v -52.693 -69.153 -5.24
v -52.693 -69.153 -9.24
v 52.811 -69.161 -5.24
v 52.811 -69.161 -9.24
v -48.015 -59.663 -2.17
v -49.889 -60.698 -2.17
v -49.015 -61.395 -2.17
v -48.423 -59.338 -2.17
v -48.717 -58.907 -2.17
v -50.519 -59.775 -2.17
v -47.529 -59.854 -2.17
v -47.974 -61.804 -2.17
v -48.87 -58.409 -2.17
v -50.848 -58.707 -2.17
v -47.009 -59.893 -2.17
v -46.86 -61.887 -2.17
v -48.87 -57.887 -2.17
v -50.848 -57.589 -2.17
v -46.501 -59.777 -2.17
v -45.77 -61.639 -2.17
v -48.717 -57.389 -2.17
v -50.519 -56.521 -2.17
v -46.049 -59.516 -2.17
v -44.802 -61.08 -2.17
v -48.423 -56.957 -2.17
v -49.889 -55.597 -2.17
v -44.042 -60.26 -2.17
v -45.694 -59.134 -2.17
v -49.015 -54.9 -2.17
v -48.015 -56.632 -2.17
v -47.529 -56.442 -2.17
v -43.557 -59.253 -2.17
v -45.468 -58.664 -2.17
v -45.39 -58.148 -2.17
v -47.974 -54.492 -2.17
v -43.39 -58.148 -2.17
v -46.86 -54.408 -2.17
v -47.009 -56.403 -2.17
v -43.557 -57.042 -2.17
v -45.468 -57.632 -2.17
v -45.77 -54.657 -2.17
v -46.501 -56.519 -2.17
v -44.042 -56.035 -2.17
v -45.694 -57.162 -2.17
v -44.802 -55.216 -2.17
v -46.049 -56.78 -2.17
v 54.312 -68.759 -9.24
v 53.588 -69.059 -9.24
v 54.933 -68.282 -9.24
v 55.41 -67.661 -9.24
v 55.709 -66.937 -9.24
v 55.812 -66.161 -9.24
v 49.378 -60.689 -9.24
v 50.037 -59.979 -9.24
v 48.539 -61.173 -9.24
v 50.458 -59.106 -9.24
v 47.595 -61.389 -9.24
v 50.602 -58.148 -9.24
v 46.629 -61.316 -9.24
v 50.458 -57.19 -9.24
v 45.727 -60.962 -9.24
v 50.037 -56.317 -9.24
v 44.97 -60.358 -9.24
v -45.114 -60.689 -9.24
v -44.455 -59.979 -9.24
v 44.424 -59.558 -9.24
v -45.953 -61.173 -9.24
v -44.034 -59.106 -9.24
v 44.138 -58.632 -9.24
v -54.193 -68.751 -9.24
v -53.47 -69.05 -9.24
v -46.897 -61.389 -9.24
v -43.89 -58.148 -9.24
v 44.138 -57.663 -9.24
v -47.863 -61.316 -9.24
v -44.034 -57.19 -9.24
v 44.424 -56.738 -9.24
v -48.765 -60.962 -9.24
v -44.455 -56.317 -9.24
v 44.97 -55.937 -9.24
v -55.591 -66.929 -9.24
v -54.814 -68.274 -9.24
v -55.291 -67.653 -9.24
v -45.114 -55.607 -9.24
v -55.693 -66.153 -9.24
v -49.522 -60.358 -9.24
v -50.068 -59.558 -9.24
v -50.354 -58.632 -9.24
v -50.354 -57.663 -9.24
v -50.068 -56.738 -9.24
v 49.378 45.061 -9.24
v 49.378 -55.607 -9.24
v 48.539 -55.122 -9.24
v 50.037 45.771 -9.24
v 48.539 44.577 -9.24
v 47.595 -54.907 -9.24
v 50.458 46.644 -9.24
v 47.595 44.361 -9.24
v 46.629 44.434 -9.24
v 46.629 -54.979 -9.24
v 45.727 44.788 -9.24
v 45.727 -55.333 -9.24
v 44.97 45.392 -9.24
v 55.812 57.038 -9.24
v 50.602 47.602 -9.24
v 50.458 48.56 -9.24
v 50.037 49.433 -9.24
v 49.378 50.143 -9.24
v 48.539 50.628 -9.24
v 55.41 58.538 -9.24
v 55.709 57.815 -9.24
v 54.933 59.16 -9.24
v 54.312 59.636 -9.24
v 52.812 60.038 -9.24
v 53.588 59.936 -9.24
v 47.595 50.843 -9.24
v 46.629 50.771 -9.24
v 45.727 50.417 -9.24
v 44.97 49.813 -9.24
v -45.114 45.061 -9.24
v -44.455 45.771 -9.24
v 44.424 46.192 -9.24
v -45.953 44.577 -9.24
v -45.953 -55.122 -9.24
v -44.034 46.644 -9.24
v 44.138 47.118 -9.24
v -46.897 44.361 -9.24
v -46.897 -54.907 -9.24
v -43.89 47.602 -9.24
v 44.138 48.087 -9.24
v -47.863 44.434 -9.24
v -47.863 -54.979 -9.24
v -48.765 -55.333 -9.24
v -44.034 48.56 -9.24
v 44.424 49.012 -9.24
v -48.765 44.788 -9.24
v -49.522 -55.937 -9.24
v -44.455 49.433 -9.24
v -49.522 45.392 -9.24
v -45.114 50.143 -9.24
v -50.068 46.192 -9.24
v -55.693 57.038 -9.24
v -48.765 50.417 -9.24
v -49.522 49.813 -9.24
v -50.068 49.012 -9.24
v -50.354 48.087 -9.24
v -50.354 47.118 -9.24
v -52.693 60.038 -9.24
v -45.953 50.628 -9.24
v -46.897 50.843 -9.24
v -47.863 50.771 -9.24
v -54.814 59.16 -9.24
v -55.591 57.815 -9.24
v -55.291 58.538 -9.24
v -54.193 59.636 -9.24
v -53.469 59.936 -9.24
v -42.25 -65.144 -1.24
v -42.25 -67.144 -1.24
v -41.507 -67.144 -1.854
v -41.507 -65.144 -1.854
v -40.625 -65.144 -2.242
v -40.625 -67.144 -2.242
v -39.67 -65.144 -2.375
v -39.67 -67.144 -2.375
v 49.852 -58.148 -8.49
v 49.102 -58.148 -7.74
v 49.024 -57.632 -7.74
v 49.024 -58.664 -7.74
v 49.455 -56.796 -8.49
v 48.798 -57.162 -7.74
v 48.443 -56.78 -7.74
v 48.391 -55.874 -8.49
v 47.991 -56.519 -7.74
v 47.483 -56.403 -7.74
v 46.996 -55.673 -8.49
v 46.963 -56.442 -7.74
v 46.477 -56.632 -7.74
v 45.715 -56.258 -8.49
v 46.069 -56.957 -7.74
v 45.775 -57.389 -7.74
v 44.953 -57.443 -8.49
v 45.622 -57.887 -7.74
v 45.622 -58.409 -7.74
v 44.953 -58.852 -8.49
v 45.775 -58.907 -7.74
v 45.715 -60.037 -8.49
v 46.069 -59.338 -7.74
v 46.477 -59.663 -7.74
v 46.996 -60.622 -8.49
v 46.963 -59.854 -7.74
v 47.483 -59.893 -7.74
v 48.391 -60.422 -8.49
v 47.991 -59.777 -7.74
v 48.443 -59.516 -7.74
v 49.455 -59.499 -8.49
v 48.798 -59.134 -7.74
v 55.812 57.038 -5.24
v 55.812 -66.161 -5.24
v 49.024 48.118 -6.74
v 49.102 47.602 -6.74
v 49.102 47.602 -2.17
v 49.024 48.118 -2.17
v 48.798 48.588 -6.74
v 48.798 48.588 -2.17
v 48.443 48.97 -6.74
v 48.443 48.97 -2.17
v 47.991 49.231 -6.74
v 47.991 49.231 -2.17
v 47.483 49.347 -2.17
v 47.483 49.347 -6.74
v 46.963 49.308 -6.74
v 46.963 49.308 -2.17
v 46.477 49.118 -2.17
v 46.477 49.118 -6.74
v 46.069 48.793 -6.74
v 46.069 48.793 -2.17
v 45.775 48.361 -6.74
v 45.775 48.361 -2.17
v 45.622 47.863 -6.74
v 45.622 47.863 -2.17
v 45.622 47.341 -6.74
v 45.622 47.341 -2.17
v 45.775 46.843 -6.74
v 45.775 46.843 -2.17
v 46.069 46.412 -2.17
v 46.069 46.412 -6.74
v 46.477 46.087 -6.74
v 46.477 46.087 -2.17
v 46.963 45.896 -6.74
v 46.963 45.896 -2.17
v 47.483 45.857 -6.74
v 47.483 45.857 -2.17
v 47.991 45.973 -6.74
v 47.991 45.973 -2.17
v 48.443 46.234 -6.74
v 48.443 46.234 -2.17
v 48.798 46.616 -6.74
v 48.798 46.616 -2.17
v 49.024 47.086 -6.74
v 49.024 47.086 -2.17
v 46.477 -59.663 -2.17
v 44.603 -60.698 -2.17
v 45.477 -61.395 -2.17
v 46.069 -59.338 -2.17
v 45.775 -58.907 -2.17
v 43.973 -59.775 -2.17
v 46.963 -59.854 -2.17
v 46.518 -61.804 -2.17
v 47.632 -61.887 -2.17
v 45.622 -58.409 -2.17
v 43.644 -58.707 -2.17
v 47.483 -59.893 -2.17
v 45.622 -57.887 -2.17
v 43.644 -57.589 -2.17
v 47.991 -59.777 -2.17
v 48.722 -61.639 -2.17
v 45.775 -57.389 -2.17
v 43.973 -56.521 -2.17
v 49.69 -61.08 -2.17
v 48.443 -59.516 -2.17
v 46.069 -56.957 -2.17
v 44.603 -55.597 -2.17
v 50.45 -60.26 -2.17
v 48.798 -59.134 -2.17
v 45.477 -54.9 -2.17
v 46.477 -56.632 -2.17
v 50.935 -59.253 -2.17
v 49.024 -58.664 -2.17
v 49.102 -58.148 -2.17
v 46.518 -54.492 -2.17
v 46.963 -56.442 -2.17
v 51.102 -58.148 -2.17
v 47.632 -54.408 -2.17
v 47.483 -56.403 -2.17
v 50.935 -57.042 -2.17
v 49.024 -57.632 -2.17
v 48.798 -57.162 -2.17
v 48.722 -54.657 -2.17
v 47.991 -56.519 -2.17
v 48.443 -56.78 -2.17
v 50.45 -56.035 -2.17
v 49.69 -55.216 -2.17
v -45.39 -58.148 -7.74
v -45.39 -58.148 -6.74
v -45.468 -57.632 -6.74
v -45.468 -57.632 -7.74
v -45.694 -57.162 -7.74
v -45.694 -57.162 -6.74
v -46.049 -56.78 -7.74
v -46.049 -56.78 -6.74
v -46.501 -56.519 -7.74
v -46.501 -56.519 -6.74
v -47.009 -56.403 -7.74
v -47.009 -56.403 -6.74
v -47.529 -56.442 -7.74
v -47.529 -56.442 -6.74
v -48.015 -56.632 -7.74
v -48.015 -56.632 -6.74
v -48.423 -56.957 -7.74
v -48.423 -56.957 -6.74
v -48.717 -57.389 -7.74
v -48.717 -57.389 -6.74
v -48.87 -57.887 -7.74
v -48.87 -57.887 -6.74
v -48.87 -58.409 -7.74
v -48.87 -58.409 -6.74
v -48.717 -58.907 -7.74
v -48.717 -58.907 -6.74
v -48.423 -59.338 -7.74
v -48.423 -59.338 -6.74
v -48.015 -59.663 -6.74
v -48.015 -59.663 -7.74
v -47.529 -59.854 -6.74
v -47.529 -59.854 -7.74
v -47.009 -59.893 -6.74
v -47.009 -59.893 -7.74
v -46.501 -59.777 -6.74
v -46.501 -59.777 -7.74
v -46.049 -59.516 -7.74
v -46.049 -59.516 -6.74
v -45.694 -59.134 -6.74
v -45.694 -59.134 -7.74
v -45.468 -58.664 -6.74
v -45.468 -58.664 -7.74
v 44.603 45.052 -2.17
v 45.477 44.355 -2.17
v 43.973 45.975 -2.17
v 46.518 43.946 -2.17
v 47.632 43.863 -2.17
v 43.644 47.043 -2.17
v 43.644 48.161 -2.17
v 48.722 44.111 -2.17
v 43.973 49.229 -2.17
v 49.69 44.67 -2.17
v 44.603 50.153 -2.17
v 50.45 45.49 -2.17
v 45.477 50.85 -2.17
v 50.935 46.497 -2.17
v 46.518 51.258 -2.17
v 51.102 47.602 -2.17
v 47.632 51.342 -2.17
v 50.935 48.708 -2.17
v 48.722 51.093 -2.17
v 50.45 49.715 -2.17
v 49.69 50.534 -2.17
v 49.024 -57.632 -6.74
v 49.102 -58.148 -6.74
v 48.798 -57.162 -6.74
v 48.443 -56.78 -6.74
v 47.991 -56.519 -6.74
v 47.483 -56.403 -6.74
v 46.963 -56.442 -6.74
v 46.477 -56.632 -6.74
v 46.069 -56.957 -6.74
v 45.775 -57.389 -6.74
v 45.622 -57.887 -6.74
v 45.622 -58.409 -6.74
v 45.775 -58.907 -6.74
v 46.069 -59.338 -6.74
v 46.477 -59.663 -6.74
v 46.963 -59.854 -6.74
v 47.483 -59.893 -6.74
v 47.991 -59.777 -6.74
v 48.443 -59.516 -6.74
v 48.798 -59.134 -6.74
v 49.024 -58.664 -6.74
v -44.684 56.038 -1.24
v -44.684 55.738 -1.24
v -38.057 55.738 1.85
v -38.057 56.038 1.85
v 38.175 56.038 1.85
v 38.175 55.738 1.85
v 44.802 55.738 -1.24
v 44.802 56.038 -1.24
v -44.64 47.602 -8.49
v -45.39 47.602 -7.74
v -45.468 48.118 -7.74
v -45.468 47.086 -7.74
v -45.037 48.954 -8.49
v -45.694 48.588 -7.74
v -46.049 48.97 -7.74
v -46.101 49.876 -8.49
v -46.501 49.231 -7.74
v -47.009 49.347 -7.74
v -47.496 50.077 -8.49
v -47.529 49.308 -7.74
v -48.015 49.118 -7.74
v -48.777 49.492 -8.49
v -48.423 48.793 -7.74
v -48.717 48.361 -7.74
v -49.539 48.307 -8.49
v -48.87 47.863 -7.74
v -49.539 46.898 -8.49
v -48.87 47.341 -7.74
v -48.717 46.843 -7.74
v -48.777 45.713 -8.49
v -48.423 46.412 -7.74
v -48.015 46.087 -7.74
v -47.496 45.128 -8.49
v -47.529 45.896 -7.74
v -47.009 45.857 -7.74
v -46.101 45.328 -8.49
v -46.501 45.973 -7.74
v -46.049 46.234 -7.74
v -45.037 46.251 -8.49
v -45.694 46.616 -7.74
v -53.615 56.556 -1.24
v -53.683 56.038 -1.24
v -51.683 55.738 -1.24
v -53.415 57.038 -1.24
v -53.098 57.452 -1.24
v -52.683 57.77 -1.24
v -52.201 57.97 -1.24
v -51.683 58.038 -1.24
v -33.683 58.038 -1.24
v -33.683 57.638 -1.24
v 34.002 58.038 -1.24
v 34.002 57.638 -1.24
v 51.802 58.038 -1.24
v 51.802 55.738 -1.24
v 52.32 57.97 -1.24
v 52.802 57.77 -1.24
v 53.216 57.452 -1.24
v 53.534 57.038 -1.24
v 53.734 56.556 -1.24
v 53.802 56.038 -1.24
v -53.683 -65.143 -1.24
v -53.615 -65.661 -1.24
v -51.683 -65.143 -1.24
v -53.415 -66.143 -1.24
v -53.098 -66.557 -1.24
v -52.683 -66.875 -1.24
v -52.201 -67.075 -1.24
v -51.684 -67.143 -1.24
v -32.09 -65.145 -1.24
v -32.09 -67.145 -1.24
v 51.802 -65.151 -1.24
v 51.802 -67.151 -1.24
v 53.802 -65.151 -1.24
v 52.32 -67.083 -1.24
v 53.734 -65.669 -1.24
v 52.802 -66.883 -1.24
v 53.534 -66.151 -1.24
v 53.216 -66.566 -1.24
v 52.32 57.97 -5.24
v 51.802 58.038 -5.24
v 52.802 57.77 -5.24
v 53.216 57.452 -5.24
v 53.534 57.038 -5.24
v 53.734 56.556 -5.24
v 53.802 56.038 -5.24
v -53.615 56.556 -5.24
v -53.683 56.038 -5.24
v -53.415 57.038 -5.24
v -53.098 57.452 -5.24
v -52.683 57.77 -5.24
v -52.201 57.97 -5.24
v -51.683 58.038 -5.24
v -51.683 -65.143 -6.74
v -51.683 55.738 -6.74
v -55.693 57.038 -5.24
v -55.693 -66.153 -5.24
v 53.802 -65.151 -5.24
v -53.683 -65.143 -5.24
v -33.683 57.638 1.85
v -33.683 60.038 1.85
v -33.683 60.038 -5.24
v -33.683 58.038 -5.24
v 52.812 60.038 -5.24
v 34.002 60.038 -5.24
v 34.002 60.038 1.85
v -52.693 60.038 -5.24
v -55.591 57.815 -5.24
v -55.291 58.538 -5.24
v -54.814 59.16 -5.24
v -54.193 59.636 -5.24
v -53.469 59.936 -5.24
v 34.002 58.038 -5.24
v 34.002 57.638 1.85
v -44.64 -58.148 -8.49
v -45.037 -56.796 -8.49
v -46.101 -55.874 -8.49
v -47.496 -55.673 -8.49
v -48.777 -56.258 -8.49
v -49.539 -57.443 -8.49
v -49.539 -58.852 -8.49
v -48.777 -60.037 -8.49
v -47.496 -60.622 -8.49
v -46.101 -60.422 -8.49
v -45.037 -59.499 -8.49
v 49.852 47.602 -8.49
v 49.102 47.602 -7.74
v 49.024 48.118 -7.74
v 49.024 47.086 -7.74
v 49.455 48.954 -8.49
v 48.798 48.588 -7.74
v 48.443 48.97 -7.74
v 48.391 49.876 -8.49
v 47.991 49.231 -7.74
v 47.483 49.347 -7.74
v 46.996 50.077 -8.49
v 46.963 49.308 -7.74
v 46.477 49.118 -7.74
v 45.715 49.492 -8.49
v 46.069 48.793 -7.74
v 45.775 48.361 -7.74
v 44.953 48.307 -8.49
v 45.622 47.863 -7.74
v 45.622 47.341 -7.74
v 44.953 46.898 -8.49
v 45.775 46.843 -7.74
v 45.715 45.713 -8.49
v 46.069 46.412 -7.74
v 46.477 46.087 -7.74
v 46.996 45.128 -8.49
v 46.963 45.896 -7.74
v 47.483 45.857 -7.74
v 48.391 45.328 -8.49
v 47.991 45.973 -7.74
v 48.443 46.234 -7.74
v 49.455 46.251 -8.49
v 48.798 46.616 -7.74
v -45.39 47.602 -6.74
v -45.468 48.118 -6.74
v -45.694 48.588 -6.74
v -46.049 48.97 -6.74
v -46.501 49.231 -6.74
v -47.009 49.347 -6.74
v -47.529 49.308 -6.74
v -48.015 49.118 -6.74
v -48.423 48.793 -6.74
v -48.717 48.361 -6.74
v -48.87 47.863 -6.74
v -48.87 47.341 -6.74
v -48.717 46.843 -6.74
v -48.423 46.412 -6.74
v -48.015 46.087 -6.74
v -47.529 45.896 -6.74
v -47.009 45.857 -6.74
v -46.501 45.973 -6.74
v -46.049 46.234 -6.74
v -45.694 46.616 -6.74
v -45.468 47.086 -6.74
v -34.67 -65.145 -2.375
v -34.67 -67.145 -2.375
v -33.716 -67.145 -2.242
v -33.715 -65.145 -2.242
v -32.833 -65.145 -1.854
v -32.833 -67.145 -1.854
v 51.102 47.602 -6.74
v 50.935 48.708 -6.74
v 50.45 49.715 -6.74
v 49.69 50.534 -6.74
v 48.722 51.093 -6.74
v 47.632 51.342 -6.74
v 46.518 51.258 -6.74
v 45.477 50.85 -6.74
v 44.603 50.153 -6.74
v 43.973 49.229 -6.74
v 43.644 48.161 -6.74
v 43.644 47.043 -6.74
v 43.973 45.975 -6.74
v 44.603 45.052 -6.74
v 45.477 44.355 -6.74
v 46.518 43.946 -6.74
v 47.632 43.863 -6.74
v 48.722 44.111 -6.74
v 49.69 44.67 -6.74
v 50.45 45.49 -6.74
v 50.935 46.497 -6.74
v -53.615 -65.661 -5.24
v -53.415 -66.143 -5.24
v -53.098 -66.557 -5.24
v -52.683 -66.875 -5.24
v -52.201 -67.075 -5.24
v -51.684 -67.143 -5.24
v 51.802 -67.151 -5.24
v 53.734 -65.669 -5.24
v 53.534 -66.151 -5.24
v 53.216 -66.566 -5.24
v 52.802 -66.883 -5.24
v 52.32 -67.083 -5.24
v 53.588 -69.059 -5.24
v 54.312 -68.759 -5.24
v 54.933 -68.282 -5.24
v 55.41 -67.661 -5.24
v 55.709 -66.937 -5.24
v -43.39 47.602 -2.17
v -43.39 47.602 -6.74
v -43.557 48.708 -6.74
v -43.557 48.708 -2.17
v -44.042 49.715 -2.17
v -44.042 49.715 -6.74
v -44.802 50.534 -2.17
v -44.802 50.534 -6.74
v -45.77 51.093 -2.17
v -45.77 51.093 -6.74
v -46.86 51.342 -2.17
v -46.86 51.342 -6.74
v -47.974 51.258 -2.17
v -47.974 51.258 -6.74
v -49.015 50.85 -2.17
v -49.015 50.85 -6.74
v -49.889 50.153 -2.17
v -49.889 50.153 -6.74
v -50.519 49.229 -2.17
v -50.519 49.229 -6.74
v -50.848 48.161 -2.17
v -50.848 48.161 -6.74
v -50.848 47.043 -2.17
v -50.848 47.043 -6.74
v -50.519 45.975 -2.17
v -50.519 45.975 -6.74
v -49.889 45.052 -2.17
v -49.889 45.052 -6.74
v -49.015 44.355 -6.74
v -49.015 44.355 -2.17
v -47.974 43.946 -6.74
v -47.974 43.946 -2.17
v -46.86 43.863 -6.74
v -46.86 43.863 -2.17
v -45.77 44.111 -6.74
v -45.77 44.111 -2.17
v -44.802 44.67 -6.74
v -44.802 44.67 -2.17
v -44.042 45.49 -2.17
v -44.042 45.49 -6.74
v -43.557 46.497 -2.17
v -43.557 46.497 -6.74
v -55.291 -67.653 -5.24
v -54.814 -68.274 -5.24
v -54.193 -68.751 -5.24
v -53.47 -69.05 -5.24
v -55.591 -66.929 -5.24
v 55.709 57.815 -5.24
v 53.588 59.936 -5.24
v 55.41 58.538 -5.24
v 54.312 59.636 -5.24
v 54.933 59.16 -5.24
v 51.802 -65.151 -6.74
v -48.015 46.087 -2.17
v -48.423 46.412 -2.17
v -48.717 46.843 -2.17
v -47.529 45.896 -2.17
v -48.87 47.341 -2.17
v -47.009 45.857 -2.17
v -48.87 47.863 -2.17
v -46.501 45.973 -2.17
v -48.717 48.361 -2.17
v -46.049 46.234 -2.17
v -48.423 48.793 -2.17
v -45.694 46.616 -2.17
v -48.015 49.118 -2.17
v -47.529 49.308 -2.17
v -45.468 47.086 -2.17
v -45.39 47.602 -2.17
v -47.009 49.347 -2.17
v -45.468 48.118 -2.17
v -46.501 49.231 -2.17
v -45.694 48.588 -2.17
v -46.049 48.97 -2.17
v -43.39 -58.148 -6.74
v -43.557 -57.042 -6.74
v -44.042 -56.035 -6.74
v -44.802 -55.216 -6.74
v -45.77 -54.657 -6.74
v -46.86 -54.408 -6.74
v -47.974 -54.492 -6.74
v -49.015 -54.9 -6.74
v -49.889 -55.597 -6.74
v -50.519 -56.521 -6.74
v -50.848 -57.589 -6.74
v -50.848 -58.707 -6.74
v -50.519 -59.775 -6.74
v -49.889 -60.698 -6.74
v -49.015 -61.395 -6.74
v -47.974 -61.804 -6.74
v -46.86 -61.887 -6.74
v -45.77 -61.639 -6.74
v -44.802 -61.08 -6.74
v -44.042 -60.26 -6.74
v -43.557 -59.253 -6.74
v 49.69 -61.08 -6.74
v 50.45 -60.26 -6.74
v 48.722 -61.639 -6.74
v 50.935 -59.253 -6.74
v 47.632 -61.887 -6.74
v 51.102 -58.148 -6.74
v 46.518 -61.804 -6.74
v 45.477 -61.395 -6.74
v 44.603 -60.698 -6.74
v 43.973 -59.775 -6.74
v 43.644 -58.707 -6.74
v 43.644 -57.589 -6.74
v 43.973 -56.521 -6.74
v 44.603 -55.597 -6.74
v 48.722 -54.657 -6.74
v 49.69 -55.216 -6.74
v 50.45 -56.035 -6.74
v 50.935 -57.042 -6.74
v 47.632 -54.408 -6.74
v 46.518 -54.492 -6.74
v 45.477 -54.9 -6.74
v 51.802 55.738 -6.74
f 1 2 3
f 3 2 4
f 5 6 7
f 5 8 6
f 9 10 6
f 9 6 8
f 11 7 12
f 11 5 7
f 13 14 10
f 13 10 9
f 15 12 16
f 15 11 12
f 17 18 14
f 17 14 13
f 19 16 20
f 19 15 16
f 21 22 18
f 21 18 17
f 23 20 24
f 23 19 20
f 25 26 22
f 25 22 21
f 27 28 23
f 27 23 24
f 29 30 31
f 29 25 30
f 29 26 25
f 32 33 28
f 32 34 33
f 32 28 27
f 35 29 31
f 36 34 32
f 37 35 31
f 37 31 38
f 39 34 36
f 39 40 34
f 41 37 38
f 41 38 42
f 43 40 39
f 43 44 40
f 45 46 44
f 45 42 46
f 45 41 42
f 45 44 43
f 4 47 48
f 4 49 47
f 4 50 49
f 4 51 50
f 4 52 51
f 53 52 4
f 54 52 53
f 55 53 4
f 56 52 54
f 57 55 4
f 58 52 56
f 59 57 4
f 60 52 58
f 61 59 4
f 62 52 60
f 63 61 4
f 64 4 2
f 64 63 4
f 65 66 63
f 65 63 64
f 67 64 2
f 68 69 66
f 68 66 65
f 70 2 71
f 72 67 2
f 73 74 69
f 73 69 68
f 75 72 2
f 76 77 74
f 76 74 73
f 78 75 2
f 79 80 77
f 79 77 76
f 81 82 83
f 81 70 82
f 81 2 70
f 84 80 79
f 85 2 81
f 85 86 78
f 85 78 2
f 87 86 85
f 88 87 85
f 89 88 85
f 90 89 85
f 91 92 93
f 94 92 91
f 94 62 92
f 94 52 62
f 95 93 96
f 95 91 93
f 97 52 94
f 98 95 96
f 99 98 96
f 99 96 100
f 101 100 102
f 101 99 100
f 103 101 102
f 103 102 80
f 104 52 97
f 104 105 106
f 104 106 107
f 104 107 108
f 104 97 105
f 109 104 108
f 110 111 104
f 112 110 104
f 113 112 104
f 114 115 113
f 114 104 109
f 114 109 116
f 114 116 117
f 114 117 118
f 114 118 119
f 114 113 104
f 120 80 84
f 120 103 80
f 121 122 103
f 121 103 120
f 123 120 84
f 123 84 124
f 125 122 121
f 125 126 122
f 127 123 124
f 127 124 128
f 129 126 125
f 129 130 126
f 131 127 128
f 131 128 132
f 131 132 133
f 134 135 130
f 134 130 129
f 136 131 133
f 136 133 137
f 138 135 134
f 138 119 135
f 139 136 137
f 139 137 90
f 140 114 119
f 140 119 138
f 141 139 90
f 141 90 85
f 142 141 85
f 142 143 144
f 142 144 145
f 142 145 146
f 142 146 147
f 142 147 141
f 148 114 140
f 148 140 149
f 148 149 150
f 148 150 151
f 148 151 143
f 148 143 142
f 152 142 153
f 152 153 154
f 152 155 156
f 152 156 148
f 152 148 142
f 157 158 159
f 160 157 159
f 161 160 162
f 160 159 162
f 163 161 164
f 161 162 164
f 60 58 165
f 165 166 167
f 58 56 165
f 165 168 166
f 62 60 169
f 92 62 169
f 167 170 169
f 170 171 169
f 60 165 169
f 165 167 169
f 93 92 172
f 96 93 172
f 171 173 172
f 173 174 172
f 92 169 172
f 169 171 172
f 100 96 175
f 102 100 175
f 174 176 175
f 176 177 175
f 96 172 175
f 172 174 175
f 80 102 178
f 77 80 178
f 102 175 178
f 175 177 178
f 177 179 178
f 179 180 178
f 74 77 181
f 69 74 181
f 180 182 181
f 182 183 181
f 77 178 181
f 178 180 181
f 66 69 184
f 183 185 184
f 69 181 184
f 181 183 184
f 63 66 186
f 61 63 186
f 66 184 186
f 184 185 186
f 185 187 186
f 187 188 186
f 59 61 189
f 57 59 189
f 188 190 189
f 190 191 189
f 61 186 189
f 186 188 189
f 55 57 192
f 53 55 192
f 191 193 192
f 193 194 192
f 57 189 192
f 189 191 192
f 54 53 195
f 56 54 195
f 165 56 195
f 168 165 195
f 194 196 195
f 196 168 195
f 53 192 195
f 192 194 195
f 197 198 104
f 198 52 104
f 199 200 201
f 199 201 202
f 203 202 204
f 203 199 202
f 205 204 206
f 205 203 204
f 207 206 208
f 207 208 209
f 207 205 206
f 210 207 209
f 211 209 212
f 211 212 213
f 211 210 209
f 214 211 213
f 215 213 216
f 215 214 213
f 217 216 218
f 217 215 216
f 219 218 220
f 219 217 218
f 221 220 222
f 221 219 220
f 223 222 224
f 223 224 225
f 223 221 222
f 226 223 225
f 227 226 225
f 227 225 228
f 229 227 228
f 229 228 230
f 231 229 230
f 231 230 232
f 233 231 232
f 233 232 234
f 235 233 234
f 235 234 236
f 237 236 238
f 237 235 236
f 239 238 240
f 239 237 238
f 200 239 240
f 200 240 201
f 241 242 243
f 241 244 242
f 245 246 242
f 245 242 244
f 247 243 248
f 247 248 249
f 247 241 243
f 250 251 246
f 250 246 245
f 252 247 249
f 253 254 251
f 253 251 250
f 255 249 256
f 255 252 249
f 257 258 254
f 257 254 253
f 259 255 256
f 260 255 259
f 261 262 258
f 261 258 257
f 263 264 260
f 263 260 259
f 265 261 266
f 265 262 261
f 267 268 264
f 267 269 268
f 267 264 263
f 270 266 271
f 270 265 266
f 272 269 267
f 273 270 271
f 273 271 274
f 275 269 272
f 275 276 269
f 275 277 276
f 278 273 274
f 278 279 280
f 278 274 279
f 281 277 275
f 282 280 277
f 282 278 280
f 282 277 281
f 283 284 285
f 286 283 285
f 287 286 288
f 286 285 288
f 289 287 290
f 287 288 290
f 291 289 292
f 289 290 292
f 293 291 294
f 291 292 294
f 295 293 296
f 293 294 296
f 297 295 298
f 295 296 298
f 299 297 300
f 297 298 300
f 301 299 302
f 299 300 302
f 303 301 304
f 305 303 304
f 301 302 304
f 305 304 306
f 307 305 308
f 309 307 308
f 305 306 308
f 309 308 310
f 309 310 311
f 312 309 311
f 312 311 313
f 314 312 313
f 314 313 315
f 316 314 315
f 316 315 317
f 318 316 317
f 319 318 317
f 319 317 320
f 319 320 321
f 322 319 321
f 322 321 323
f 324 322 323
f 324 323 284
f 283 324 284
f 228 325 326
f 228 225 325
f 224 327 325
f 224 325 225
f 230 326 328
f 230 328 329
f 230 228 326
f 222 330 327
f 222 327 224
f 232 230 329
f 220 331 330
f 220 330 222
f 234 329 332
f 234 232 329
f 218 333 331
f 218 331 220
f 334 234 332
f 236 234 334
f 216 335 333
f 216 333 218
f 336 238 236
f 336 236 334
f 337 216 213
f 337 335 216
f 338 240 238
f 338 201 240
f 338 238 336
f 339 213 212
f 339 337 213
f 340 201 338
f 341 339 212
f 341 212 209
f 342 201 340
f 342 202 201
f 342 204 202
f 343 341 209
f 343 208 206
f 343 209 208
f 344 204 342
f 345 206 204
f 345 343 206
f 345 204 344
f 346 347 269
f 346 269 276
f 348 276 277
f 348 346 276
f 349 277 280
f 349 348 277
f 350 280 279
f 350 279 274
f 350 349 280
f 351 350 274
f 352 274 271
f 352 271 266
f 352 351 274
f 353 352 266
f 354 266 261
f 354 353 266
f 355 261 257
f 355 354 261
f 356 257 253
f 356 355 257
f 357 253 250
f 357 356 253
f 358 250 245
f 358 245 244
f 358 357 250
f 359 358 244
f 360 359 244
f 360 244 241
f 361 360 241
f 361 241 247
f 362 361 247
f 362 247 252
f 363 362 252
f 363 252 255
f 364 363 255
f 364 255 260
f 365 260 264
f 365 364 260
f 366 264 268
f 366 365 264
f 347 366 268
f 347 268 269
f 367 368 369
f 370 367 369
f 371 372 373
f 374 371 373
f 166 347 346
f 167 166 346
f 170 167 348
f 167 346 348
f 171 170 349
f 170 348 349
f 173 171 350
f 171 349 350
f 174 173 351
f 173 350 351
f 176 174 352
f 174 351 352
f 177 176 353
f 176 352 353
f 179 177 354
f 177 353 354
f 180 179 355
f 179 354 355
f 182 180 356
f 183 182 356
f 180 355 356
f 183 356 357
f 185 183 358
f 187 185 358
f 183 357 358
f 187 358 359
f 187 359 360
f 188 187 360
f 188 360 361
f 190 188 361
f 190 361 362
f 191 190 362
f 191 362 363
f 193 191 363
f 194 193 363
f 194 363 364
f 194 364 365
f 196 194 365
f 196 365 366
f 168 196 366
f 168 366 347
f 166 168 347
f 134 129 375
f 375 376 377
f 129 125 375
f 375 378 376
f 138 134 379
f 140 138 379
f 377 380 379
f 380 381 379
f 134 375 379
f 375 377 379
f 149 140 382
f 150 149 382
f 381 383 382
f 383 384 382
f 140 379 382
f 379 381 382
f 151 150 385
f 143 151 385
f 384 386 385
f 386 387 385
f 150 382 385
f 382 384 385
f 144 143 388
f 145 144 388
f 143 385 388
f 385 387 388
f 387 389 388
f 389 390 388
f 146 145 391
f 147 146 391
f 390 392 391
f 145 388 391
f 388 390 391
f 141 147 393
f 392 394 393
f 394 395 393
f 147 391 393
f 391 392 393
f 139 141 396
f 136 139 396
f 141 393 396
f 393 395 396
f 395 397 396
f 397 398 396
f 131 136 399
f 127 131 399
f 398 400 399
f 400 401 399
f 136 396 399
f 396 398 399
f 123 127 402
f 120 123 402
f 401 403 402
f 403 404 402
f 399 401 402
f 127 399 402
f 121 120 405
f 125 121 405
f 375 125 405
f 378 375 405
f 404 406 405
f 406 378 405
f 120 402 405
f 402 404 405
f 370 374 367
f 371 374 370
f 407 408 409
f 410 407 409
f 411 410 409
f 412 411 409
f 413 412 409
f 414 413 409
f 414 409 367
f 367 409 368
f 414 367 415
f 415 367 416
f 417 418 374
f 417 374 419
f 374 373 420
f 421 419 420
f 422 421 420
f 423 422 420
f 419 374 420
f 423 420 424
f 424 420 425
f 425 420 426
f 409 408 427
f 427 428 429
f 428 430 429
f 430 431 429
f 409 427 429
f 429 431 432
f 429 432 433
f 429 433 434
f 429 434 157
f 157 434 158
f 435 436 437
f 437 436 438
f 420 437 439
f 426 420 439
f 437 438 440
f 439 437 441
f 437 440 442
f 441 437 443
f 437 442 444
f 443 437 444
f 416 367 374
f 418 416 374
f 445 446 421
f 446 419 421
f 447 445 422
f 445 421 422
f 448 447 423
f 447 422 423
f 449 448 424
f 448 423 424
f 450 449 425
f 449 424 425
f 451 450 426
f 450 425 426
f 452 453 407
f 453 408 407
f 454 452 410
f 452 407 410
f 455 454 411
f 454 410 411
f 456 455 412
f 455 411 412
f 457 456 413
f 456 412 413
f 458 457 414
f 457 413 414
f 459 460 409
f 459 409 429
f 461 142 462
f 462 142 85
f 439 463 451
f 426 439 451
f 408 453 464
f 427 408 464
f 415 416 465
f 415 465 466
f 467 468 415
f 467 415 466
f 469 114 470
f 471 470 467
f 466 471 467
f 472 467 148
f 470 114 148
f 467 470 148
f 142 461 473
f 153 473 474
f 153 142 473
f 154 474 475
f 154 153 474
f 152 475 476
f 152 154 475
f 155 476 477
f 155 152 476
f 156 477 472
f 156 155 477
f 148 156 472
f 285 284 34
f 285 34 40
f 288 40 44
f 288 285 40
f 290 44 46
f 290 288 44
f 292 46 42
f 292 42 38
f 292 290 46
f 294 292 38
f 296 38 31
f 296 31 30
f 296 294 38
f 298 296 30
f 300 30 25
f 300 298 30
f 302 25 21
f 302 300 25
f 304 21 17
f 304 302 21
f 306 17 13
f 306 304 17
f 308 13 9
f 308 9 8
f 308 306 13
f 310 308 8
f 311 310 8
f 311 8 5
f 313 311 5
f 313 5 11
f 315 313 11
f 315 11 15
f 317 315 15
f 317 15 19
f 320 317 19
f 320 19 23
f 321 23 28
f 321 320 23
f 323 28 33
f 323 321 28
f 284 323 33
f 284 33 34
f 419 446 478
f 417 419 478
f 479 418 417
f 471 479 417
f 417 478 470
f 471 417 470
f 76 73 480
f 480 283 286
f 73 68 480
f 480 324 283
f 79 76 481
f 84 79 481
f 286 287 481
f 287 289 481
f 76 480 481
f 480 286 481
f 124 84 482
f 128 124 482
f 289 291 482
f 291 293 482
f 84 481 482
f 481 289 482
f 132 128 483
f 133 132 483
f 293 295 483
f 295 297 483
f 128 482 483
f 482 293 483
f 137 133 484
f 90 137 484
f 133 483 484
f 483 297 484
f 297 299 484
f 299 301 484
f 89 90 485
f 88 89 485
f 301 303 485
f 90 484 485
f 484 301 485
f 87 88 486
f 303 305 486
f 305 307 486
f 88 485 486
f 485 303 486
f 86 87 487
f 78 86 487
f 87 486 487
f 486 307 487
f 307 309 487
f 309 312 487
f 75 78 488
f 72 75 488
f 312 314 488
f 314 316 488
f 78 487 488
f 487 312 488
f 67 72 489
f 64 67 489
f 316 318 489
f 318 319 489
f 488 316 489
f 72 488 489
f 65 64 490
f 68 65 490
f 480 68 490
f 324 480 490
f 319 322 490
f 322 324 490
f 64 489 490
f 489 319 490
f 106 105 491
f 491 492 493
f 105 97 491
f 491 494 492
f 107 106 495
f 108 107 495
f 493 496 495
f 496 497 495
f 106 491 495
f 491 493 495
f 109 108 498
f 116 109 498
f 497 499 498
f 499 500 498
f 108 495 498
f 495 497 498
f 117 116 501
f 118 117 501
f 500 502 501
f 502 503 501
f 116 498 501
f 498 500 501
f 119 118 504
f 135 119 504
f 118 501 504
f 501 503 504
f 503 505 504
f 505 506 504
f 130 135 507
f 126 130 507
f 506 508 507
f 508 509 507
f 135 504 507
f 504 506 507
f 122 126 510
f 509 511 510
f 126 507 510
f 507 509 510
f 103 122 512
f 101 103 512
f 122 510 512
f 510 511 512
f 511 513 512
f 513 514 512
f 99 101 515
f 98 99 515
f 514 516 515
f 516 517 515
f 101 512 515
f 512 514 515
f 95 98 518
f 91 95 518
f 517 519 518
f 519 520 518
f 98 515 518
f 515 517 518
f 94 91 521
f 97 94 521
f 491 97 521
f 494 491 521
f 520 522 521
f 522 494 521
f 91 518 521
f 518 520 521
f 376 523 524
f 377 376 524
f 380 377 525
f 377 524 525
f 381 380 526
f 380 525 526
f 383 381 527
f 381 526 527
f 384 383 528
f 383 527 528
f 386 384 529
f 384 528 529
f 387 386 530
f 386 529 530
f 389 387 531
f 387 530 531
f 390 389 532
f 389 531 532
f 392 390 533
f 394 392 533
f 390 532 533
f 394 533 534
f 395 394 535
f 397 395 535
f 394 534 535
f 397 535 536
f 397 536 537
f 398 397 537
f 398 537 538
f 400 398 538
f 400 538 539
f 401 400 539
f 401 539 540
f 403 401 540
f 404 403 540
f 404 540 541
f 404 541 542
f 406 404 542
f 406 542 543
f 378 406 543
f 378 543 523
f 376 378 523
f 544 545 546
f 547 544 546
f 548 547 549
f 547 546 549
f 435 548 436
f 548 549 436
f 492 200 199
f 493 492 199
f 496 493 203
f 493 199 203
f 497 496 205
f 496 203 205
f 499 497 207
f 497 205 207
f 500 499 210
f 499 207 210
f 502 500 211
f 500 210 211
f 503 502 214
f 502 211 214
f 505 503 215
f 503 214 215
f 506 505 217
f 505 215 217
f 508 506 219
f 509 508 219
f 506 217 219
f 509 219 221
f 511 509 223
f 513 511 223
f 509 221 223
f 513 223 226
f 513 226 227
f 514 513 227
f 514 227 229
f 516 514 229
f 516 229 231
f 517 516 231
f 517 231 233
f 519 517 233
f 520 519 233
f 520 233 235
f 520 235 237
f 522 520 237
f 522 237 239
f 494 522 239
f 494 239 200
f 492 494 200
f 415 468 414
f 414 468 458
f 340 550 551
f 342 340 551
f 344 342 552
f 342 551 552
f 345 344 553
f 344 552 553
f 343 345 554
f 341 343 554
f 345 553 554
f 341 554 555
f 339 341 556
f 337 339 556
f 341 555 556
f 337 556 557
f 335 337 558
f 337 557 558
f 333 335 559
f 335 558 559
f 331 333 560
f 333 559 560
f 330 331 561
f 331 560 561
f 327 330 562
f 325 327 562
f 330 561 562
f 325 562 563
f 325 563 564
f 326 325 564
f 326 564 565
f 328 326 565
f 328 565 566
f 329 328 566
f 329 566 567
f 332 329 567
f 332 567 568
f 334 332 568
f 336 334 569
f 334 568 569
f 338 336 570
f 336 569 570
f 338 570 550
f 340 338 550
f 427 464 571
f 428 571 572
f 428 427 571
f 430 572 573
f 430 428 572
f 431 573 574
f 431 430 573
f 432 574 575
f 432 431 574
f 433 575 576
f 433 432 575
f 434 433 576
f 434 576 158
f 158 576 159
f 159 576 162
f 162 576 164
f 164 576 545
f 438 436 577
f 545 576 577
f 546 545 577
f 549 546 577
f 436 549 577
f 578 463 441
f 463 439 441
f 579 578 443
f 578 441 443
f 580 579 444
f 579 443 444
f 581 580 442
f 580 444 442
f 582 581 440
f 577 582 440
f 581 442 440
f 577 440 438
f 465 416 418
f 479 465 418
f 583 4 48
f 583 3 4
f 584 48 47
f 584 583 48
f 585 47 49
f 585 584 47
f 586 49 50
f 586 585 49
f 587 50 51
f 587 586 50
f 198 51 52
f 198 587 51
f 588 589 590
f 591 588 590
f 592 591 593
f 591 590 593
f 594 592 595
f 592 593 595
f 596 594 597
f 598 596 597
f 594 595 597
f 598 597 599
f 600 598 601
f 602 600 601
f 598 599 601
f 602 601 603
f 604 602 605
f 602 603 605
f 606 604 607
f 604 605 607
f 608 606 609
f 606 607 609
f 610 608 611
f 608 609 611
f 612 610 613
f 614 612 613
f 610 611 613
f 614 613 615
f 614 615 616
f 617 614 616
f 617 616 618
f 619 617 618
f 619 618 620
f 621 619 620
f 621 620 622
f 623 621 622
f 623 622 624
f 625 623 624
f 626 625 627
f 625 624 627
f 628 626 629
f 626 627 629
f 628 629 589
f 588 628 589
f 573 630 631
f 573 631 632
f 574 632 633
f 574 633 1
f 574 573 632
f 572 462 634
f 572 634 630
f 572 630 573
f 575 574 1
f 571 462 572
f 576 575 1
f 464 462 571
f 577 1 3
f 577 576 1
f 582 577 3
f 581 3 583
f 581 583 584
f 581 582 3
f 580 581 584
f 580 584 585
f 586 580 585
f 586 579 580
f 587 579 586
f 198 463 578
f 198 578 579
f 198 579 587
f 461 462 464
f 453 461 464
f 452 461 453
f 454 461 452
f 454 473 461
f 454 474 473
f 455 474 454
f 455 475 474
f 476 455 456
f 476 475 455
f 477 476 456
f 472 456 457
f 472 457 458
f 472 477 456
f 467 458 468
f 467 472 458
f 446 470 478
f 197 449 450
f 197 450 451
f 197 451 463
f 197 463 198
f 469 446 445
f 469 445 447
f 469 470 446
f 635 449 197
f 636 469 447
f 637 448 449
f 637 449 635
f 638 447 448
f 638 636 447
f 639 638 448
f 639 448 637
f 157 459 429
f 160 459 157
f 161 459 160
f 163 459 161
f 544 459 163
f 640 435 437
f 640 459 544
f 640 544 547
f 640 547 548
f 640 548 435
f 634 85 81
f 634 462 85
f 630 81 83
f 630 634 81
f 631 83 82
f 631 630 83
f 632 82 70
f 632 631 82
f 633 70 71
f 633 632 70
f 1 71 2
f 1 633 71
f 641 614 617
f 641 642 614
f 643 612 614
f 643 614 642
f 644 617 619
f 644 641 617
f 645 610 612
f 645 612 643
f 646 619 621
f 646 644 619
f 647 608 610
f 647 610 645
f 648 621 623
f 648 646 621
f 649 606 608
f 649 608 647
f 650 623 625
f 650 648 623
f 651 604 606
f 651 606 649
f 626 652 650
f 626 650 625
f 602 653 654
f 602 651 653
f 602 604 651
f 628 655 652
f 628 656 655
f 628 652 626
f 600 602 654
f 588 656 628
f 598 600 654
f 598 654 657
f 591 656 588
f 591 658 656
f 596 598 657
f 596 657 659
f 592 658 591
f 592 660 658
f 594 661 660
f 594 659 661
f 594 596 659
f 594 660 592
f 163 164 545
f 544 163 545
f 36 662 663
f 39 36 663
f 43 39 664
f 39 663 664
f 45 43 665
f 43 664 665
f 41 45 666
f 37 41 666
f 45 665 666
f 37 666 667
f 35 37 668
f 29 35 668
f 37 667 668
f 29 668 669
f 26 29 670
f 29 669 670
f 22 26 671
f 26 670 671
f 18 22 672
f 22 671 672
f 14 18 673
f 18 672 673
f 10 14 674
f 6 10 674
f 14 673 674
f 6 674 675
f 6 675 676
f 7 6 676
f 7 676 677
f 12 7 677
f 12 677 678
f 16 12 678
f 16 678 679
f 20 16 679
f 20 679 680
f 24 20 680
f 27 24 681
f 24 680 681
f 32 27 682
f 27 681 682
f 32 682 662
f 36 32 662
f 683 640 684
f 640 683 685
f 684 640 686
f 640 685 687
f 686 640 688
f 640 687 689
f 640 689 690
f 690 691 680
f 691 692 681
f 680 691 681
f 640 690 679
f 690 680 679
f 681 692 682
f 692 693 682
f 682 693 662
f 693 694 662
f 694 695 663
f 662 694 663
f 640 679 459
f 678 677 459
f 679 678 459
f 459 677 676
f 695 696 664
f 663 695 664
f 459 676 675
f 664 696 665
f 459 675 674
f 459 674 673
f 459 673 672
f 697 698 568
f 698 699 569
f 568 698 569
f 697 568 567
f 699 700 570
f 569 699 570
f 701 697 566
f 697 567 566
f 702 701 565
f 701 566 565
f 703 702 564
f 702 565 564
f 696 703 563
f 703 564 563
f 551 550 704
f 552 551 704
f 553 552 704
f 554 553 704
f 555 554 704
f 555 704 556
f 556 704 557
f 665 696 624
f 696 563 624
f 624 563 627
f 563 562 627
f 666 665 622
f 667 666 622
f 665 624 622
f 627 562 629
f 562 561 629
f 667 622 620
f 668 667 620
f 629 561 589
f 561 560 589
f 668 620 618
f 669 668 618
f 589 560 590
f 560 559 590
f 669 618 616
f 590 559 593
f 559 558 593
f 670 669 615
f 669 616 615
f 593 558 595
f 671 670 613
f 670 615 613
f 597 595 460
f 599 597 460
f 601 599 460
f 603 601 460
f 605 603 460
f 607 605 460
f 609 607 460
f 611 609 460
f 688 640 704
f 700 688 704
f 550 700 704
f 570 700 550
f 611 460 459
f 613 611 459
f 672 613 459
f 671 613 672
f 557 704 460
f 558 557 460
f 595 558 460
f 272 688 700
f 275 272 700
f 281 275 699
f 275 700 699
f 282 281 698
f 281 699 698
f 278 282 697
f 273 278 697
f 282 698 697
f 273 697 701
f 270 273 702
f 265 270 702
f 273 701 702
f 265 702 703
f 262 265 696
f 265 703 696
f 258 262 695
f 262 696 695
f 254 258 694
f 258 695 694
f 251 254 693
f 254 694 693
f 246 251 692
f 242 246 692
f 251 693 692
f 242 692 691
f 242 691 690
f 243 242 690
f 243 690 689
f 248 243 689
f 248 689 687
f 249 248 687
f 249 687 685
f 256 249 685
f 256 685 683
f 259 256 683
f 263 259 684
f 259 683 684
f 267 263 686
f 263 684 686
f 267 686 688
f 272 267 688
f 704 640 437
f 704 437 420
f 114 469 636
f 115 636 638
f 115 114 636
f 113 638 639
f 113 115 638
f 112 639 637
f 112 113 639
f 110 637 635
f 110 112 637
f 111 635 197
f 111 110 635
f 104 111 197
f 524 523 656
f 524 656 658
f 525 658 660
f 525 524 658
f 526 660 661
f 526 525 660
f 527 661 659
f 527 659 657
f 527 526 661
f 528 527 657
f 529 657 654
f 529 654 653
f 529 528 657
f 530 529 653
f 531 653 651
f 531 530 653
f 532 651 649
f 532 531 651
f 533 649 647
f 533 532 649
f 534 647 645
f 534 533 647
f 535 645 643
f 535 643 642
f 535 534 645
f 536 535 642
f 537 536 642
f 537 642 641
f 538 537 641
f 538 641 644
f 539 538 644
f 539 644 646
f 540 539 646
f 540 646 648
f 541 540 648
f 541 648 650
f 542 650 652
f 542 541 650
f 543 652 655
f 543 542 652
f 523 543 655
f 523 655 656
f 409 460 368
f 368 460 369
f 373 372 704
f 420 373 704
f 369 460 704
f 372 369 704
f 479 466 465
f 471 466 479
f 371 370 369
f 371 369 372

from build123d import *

# Parameters (mm, degrees)
DODANIE_WYCI_GNI_CIE1_DEPTH      = 0.5
DODANIE_WYCI_GNI_CIE1_DEPTH_BACK = 2
DODANIE_WYCI_GNI_CIE2_DEPTH      = 5.5
DODANIE_WYCI_GNI_CIE3_DEPTH      = 1.5
ZAOKR_GLENIE1_R                  = 2
SZKIC6_W                         = 67.685530181
SZKIC6_H                         = 2.4
DODANIE_WYCI_GNI_CIE4_DEPTH      = 8.59
DODANIE_WYCI_GNI_CIE5_DEPTH      = 8.59
WYTNIJ_WYCI_GNI_CIE1_DEPTH       = 5.5
SZKIC13_R                        = 3.75
SZKIC13_R_2                      = 1.75
DODANIE_WYCI_GNI_CIE7_DEPTH      = 4.57
SZKIC13_3_R                      = 1.75
WYTNIJ_WYCI_GNI_CIE2_DEPTH       = 90.286037732
WYTNIJ_WYCI_GNI_CIE3_DEPTH       = 2
SFAZOWANIE1_SIZE                 = 1.5
ZAOKR_GLENIE2_R                  = 3


with BuildPart() as part:
    # Szkic3 → Dodanie-wyciągnięcie1 (new, two sides: drawn at the far end of the back side and taken through both)
    with BuildSketch(Plane(origin=(0, 0, -8.74), x_dir=(-1, 0, 0), z_dir=(0, 0, -1)).offset(-DODANIE_WYCI_GNI_CIE1_DEPTH_BACK)):
        Polygon((55.692889856, -69.15246634), (55.692892168, 60.038263946), (-55.811722529, 60.038263946), (-55.811687853, -69.161116694), align=None)
    extrude(amount=DODANIE_WYCI_GNI_CIE1_DEPTH + DODANIE_WYCI_GNI_CIE1_DEPTH_BACK)

    # Szkic4 → Dodanie-wyciągnięcie2 (add)
    with BuildSketch(Plane.XY.offset(-6.74)):
        Polygon((53.802147291, -67.151419689), (53.80218089, 58.038263946), (-53.683348754, 58.038263946), (-53.683348754, -67.143081129), align=None)
        Polygon((51.802147827, -65.151264526), (51.802180354, 56.038263946), (-51.683348754, 56.038263946), (-51.683348754, -65.14323628), align=None, mode=Mode.SUBTRACT)
    extrude(amount=DODANIE_WYCI_GNI_CIE2_DEPTH)

    # Szkic4<3> → Dodanie-wyciągnięcie3 (add)
    with BuildSketch(Plane.XY.offset(-6.74)):
        Polygon((-55.692892168, 60.038263946), (-55.692889856, -69.15246634), (55.811687853, -69.161116694), (55.811722529, 60.038263946), align=None)
        Polygon((-53.683348754, -67.143081129), (-53.683348754, 58.038263946), (53.80218089, 58.038263946), (53.802147291, -67.151419689), align=None, mode=Mode.SUBTRACT)
    extrude(amount=DODANIE_WYCI_GNI_CIE3_DEPTH)

    # Zaokrąglenie1
    zaokr_glenie1_edges = [part.edges().sort_by_distance(p)[0] for p in [
        (53.80218089, 58.038263946, -3.24),
        (-53.683348754, 58.038263946, -3.24),
        (-53.683348754, -67.143081129, -3.24),
        (53.802147291, -67.151419689, -3.24),
    ]]
    fillet(zaokr_glenie1_edges, radius=ZAOKR_GLENIE1_R)

    # Szkic6 → Dodanie-wyciągnięcie4 (add)
    with BuildSketch(Plane.XY.offset(-6.74)):
        with Locations((0.159416337, 58.838263946)):
            Rectangle(SZKIC6_W, SZKIC6_H)
    extrude(amount=DODANIE_WYCI_GNI_CIE4_DEPTH)

    # Szkic7 → Dodanie-wyciągnięcie5 (add)
    with BuildSketch(Plane.XY.offset(-6.74)):
        Polygon((-51.683348754, 55.738263946), (51.802180273, 55.738263946), (51.802180354, 56.038263946), (-51.683348754, 56.038263946), align=None)
    extrude(amount=DODANIE_WYCI_GNI_CIE5_DEPTH)

    # Szkic9 → Wytnij-wyciągnięcie1 (cut)
    with BuildSketch(Plane.XZ.offset(-55.738263946)):
        Polygon((51.802180273, 1.85), (38.175466286, 1.85), (44.80199267, -1.24), (51.80199267, -1.24), (51.802180273, -1.24), align=None)
        Polygon((-38.056977527, 1.85), (-51.683348754, 1.85), (-51.683348754, -1.24), (-44.683503911, -1.24), align=None)
    extrude(amount=-WYTNIJ_WYCI_GNI_CIE1_DEPTH, mode=Mode.SUBTRACT)

    # Szkic13 → Dodanie-wyciągnięcie7 (add)
    # profile 1 of 4: a face of its own
    with BuildSketch(Plane.XY.offset(-6.74)):
        with Locations((-47.14, 47.6022)):
            Circle(SZKIC13_R)
        with Locations((-47.14, 47.6022)):
            Circle(SZKIC13_R_2, mode=Mode.SUBTRACT)
    # profile 2 of 4: a face of its own
    with BuildSketch(Plane.XY.offset(-6.74)):
        with Locations((47.352, 47.6022)):
            Circle(SZKIC13_R)
        with Locations((47.352, 47.6022)):
            Circle(SZKIC13_R_2, mode=Mode.SUBTRACT)
    # profile 3 of 4: a face of its own
    with BuildSketch(Plane.XY.offset(-6.74)):
        with Locations((-47.14, -58.1478)):
            Circle(SZKIC13_R)
        with Locations((-47.14, -58.1478)):
            Circle(SZKIC13_R_2, mode=Mode.SUBTRACT)
    # profile 4 of 4: a face of its own
    with BuildSketch(Plane.XY.offset(-6.74)):
        with Locations((47.352, -58.1478)):
            Circle(SZKIC13_R)
        with Locations((47.352, -58.1478)):
            Circle(SZKIC13_R_2, mode=Mode.SUBTRACT)
    extrude(amount=DODANIE_WYCI_GNI_CIE7_DEPTH)

    # Szkic13<3> → Wytnij-wyciągnięcie2 (cut, through all)
    with BuildSketch(Plane.XY.offset(-6.74)):
        with Locations((-47.14, -58.1478)):
            Circle(SZKIC13_3_R)
        with Locations((-47.14, 47.6022)):
            Circle(SZKIC13_3_R)
        with Locations((47.352, 47.6022)):
            Circle(SZKIC13_3_R)
        with Locations((47.352, -58.1478)):
            Circle(SZKIC13_3_R)
    extrude(amount=-WYTNIJ_WYCI_GNI_CIE2_DEPTH, mode=Mode.SUBTRACT)

    # Szkic18 → Wytnij-wyciągnięcie3 (cut)
    with BuildSketch(Plane(origin=(-0.00520918, -67.147245397, 0), x_dir=(0.999999996990791, -7.757846392237927e-05, 0), z_dir=(-7.757846392237927e-05, -0.999999996990791, 0))):
        with BuildLine():
            ThreePointArc((-42.245261471, -1.24), (-41.074504923, -2.078778872), (-39.665102055, -2.375097025))
            Line((-39.665102055, -2.375097025), (-34.665098037, -2.375097025))
            ThreePointArc((-34.665098037, -2.375097025), (-33.255694971, -2.078778946), (-32.084938256, -1.24))
            Line((-32.084938256, -1.24), (-42.245261471, -1.24))
        make_face()
    extrude(amount=-WYTNIJ_WYCI_GNI_CIE3_DEPTH, mode=Mode.SUBTRACT)

    # Sfazowanie1
    sfazowanie1_edges = [part.edges().sort_by_distance(p)[0] for p in [
        (45.602, -58.1478, -9.24),
        (45.602, 47.6022, -9.24),
        (-48.89, 47.6022, -9.24),
        (-48.89, -58.1478, -9.24),
    ]]
    chamfer(sfazowanie1_edges, length=SFAZOWANIE1_SIZE)

    # Zaokrąglenie2
    zaokr_glenie2_edges = [part.edges().sort_by_distance(p)[0] for p in [
        (55.811687853, -69.161116694, -7.24),
        (55.811722529, 60.038263946, -7.24),
        (-55.692892168, 60.038263946, -7.24),
        (-55.692889856, -69.15246634, -7.24),
    ]]
    fillet(zaokr_glenie2_edges, radius=ZAOKR_GLENIE2_R)


solid = part.part
